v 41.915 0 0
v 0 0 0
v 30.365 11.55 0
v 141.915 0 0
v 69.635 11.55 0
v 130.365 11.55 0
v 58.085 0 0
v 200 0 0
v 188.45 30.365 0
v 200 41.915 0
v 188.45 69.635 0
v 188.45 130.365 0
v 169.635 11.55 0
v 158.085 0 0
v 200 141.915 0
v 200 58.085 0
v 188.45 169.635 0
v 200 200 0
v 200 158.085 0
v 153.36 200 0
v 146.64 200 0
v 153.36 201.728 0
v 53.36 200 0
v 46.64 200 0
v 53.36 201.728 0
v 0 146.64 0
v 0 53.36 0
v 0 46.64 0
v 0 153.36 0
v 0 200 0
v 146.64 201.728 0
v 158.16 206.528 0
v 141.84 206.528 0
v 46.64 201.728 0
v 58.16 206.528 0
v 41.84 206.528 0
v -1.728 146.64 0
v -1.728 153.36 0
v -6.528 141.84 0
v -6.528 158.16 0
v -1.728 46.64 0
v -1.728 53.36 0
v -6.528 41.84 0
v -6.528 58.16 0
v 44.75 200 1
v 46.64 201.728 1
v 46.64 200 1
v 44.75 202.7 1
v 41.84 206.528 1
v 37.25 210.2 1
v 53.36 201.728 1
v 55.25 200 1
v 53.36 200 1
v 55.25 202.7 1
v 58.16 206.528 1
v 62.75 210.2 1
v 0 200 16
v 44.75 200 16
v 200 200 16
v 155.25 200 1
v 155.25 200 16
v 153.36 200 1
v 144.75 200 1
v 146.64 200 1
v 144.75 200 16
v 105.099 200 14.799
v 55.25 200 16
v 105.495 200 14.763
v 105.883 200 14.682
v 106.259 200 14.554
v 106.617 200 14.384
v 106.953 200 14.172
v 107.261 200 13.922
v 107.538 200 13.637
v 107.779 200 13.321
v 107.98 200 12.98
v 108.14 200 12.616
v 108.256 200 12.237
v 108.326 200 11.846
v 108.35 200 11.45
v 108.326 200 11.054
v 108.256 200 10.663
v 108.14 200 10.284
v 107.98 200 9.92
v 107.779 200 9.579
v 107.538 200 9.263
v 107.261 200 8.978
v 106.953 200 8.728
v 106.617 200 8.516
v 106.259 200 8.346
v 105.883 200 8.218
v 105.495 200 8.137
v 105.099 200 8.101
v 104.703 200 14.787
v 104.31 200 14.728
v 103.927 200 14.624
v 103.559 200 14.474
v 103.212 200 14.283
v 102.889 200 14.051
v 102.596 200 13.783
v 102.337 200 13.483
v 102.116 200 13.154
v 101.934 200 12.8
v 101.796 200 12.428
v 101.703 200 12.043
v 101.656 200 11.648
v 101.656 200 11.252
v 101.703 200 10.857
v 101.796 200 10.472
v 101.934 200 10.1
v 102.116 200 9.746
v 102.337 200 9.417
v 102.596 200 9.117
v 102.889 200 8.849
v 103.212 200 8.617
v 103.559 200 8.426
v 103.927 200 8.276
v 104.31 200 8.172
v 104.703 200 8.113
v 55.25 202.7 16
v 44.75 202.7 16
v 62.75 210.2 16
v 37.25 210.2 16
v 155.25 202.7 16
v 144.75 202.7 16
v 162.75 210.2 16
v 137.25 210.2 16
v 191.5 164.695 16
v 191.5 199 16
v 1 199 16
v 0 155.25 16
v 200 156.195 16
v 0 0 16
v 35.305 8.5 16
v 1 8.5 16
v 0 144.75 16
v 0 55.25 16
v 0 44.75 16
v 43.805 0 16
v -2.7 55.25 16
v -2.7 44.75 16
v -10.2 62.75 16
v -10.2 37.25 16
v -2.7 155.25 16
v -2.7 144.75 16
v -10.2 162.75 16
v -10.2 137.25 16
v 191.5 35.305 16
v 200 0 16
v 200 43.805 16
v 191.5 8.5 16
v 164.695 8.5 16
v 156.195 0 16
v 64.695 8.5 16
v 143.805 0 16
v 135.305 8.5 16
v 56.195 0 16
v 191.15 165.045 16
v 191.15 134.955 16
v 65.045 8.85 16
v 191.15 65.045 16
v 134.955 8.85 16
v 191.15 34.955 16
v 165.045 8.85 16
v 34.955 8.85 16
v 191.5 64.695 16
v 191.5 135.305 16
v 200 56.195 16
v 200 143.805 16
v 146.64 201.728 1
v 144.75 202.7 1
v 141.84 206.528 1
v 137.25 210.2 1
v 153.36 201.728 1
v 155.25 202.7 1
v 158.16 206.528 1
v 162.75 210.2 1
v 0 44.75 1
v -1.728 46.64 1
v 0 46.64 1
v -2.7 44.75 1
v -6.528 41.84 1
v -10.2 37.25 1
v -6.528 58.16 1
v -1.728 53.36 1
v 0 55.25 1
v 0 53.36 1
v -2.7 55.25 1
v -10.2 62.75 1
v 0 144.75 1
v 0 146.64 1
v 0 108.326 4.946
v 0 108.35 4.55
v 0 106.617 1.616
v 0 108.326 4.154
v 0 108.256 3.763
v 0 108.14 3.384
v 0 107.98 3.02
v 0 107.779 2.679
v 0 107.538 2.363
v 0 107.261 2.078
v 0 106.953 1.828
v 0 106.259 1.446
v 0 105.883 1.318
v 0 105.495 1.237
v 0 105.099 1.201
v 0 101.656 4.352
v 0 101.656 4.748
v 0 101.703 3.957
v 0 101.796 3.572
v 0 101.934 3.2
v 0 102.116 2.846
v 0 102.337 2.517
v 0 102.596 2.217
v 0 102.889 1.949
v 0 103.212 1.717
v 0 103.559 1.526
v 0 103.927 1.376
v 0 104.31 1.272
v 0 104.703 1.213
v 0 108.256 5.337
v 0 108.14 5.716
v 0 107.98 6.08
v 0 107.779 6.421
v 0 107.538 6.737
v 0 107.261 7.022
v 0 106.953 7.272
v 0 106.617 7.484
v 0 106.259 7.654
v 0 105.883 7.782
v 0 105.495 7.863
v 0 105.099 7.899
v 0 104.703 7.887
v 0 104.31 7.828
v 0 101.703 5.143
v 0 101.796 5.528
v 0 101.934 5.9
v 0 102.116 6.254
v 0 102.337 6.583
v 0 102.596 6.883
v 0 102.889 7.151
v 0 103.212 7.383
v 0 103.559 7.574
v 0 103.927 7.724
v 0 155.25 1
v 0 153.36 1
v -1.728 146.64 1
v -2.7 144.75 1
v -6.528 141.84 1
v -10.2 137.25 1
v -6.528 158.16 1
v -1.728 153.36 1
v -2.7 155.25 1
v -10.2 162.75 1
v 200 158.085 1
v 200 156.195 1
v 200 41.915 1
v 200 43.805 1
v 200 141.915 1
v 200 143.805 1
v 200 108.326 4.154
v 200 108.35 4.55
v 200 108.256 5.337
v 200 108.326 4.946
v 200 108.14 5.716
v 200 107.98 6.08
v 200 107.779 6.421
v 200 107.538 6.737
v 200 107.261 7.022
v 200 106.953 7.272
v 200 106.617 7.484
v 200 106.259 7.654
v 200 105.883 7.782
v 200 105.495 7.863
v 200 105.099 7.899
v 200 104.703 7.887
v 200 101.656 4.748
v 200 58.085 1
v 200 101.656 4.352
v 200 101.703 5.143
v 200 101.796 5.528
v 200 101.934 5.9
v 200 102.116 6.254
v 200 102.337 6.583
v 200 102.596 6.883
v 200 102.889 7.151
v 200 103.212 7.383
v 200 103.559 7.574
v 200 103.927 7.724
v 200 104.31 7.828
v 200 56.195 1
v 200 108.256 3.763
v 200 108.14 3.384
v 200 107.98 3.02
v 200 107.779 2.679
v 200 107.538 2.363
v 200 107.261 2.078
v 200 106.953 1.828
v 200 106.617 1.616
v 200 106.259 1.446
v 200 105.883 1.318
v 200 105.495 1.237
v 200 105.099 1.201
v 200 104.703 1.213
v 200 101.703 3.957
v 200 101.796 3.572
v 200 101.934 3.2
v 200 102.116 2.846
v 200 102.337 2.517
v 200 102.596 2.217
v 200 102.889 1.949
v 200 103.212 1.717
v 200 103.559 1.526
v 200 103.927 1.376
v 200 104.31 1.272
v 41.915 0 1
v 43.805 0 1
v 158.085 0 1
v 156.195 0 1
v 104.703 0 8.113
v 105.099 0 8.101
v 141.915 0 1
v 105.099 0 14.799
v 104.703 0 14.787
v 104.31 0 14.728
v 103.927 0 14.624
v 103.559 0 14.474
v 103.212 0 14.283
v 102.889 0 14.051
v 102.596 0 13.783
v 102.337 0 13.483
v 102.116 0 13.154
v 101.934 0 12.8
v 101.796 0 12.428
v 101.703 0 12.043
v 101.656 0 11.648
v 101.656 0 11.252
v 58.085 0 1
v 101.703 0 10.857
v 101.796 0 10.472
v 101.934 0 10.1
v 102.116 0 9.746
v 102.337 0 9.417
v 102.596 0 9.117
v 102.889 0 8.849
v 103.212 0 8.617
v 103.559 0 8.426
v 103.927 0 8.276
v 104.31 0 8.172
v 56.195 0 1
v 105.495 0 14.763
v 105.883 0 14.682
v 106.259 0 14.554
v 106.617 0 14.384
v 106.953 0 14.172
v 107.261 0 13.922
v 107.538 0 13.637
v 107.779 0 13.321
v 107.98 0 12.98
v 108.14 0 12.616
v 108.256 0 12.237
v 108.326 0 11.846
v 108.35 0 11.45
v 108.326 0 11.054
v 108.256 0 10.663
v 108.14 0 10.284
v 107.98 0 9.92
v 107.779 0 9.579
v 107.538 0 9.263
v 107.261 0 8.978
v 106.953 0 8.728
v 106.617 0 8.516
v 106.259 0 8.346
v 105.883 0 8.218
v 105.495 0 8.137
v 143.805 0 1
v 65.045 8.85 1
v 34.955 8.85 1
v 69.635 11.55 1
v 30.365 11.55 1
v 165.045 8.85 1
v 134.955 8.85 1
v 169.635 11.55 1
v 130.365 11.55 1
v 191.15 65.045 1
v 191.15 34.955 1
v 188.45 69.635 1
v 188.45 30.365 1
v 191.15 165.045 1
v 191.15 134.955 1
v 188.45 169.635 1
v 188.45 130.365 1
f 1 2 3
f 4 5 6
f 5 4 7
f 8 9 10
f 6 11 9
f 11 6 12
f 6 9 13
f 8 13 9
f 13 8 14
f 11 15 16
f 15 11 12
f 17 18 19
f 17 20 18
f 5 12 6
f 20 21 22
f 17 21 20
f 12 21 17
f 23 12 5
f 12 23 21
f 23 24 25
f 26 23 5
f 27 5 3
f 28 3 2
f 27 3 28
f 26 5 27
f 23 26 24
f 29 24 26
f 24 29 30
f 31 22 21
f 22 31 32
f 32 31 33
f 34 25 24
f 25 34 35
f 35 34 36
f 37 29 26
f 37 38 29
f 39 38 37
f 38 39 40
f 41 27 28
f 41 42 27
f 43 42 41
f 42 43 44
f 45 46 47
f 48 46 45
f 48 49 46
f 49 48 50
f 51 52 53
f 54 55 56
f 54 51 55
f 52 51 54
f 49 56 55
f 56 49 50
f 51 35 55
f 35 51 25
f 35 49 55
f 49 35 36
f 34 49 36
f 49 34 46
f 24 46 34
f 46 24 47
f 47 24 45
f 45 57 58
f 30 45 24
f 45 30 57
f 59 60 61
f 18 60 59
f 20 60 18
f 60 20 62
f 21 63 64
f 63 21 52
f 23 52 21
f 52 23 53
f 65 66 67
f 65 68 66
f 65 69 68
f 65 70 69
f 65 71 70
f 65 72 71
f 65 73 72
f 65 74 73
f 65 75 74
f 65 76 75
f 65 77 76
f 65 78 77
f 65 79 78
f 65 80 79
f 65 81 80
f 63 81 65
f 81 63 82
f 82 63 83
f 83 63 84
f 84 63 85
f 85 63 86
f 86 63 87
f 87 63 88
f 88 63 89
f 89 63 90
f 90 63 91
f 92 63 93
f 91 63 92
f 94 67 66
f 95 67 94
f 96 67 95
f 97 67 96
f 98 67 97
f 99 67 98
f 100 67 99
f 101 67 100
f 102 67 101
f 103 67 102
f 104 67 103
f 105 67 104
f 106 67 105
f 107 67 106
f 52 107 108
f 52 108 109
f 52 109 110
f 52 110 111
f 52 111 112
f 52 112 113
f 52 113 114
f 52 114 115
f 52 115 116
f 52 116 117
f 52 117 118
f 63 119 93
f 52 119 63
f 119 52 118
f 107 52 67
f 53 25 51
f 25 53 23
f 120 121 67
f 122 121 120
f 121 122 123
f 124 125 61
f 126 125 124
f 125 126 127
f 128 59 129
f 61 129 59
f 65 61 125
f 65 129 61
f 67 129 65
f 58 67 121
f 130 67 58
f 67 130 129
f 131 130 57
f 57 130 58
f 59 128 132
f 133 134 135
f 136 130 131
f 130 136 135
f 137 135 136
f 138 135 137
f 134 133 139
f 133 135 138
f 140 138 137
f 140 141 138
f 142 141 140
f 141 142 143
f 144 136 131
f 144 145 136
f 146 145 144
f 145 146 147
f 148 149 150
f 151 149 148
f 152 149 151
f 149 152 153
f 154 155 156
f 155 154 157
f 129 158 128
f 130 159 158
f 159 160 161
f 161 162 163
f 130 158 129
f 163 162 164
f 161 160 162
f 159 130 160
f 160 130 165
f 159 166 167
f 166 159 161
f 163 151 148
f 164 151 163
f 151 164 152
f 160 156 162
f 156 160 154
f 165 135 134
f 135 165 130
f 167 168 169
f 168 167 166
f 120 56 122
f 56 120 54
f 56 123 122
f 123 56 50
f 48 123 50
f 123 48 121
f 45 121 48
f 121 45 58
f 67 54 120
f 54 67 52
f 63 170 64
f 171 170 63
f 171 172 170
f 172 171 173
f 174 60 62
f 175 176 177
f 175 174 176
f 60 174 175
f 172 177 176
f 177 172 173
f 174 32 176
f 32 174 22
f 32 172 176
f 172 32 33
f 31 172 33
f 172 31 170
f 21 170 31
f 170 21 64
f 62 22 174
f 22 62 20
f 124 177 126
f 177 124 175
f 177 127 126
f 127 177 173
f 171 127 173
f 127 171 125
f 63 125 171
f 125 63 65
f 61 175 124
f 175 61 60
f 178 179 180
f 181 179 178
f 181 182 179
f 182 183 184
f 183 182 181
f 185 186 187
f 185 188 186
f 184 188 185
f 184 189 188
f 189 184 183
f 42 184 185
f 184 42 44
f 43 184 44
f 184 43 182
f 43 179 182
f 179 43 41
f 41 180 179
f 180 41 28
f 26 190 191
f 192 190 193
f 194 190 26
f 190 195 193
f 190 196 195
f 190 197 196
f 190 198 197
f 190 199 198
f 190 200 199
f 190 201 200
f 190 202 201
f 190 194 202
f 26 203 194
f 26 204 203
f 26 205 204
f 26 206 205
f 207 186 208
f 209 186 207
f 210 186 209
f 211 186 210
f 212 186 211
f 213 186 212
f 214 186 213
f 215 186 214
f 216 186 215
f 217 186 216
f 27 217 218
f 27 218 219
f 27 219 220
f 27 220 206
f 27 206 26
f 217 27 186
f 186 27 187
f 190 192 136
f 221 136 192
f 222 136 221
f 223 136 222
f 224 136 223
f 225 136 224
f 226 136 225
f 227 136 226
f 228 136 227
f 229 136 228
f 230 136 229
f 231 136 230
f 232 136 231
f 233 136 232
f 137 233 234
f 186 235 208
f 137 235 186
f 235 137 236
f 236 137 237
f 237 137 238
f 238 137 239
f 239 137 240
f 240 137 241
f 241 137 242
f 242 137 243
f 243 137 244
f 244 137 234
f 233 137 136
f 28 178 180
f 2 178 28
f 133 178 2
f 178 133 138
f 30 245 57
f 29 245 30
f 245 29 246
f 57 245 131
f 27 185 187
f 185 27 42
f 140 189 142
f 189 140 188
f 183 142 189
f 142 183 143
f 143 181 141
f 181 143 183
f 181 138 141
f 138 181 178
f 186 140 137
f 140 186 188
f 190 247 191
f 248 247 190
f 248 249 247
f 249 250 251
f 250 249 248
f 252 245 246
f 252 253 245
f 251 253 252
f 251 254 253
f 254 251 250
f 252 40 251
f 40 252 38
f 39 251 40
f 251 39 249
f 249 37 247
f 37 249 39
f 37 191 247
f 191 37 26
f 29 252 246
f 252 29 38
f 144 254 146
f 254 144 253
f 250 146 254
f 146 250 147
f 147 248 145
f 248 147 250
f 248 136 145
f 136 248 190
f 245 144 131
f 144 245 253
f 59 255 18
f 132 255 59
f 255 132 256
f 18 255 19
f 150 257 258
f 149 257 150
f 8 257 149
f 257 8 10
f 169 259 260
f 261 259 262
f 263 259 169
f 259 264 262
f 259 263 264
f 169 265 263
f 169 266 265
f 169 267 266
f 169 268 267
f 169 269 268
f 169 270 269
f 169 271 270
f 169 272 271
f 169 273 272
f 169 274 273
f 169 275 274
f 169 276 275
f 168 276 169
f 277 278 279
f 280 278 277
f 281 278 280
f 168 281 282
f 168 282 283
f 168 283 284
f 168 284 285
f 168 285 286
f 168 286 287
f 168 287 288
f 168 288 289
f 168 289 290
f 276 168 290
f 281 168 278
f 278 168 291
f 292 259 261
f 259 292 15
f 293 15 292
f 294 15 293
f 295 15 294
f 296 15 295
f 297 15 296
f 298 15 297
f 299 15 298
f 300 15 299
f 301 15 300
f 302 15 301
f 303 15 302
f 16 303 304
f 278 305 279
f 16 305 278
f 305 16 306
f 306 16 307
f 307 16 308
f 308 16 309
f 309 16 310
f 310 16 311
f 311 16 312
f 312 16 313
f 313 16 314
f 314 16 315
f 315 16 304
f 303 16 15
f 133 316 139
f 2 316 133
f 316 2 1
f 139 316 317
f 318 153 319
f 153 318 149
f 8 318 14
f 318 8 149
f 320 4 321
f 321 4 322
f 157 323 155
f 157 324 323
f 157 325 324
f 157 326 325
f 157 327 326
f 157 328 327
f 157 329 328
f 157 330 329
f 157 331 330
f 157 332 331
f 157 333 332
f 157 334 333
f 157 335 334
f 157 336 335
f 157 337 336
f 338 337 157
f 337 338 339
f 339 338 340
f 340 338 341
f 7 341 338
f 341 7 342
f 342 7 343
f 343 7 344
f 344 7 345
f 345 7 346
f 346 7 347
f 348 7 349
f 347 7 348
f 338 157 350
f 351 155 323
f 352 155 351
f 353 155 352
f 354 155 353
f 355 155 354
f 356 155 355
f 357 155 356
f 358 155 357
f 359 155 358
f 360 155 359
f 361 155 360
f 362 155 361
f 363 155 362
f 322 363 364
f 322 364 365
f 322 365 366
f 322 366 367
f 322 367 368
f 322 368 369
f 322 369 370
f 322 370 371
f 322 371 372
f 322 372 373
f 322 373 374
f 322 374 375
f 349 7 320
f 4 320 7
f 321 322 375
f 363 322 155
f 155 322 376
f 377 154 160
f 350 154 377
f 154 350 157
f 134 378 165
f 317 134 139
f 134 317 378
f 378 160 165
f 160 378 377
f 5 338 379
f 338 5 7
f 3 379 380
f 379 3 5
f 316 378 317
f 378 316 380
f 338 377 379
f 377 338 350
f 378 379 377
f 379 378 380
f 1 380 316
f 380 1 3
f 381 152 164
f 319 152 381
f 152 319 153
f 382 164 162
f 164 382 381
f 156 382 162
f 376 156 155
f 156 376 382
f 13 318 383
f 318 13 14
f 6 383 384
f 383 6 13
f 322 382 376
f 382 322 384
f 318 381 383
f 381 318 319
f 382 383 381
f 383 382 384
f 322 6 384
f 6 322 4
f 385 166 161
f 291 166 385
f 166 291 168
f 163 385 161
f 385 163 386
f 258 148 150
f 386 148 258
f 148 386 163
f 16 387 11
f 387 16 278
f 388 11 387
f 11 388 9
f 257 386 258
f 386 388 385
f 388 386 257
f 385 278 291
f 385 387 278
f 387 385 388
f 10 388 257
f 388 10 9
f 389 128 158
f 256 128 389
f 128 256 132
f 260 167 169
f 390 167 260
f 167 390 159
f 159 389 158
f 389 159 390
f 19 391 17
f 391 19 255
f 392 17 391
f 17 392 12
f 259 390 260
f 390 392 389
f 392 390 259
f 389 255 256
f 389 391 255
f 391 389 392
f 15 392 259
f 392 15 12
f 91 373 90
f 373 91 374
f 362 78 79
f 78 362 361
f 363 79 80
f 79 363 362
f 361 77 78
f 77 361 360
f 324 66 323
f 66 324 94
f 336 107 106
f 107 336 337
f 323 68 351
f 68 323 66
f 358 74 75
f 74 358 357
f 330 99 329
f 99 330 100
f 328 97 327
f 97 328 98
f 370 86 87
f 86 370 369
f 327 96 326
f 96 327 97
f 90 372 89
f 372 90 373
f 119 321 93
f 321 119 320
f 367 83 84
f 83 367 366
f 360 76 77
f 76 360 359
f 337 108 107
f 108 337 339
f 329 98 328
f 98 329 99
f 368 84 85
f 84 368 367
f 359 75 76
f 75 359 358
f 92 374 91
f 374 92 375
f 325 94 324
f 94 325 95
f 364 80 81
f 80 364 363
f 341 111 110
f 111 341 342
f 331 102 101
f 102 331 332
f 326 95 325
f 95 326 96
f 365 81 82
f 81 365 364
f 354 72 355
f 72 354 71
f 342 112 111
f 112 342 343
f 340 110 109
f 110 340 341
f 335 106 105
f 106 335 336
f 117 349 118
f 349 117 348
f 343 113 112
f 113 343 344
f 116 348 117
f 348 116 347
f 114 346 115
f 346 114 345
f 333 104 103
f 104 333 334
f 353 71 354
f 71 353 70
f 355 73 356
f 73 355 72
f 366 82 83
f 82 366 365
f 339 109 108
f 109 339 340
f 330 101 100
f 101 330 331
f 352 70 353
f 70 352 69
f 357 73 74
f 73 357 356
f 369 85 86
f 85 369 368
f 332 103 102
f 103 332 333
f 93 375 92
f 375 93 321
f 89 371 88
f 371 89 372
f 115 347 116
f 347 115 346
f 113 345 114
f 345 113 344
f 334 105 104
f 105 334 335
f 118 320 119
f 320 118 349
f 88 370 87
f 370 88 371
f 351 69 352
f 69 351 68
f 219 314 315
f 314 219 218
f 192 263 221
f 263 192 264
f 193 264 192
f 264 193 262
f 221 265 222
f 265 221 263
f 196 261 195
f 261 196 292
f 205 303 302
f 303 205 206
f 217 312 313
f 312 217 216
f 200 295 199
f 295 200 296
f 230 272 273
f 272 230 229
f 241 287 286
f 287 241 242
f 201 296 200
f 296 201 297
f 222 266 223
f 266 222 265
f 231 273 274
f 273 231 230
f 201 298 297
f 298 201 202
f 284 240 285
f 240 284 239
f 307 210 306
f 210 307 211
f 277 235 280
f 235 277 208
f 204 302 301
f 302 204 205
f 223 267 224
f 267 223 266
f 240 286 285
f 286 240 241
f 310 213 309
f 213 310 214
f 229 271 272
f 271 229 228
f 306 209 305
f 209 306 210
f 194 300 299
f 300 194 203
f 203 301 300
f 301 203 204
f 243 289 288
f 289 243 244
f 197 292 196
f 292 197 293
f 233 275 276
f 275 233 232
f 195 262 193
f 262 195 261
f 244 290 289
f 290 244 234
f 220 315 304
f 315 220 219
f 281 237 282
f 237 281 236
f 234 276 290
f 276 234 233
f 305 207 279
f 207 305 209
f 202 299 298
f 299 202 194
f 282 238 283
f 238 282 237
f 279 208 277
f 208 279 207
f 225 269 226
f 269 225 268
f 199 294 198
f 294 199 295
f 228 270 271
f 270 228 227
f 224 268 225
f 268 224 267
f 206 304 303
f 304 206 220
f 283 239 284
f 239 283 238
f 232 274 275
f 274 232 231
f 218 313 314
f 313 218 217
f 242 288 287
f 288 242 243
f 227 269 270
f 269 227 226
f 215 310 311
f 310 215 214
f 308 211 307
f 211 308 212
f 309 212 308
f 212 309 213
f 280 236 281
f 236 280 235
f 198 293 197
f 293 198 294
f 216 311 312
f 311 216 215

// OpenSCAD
// Current data: 22h and 240g of PLA

$fa = 1;
$fs = 0.4;

module dovetile(
    //Box Width in units
    BoxWidthUnits = 2,
    //Box Length in units
    BoxLengthUnits = 2,
    //Box Height in mm
    BoxHeight = 16,
    //Box Floor Thickness in mm
    BoxFloor = 16,
    //North Wall open or closed
    NorthWallOpen = 0, // [0:Closed, 1:Open]
    //South Wall open or closed
    SouthWallOpen = 0 // [0:Closed, 1:Open]
)
{
echo(version=version(2.0));
//comments: Version 2 adds anti-"elephant foot" scaling at bottom of dovetail sections
/* [Size] */
//Box unit size in mm. This defines the size of 1 'unit' for your box.
BoxUnits = 100;
BoxWidth = BoxWidthUnits * BoxUnits;
BoxLength = BoxLengthUnits * BoxUnits;
//Box Wall Thickness in mm
BoxWall = 1;
//Fit Factor. Greater factor = looser fit
FitFactor = 0.18;  // [0:0.05:0.4]
//RoundedBottom = "EW"; // [EW:East-West, NS:North-South]
RoundedBottom = ""; // [EW:East-West, NS:North-South]

/* [Walls] */

/* [Dovetail] */
//Dovetail inside length in mm
DTInsideLength = 10.5;
//Dovetail angle in degrees
DTAngle = 45;
//Dovetail width in mm
DTWidth = 7.5;

/* [Hidden] */
//This helps calculate the length of the 'long' side of the dovetail
DTx=tan(DTAngle)*DTWidth;
//This polygon defines the dovetail shape
DTShape = [[0,0],[DTInsideLength/2,0],[DTInsideLength/2+DTx,DTWidth],[-DTInsideLength/2-DTx,DTWidth],[-DTInsideLength/2,0]];



union(){

    //Creates main box,without round bottom
    difference(){
        
    union(){
        //main box
    cube([BoxLength,BoxWidth,BoxHeight], center=false);

        //male dovetails
    for (i=[1:BoxLengthUnits])
    translate([(i-1)*BoxUnits+(BoxUnits/2),BoxWidth,0])
        //in 2 sections. first section is slightly scaled down to counter "elephant foot"
        union(){
            linear_extrude(height=1, center=false)
                scale([1-(2*FitFactor),1-(2*FitFactor),1])
                union(){        
                    //this adds a slight offset to the male dovetail for a looser fit
                    translate([-DTInsideLength/2,0,0])
                    square([DTInsideLength,DTWidth]);
                    //main dovetail shape
                    translate([0,DTWidth*FitFactor*2,0])
                    polygon(DTShape);
                };
            translate([0,0,1])
            linear_extrude(height=BoxHeight-1, center=false)
                    union(){
                    //this adds a slight offset to the male dovetail for a looser fit
                    translate([-DTInsideLength/2,0,0])
                    square([DTInsideLength,DTWidth]);
                    //main dovetail shape
                    translate([0,DTWidth*FitFactor*2,0])
                    polygon(DTShape);
                    };
        }        

    for (i=[1:BoxWidthUnits])
    translate([0,(i-1)*BoxUnits+(BoxUnits/2),0])
        //in 2 sections. first section is slightly scaled down to counter "elephant foot"
        rotate([0,0,90])
        union(){
            linear_extrude(height=1, center=false)				//1mm high anti-elephant foot section
                scale([1-(2*FitFactor),1-(2*FitFactor),1])
                union(){        
                    //this adds a slight offset to the male dovetail for a looser fit
                    translate([-DTInsideLength/2,0,0])
                    square([DTInsideLength,DTWidth]);
                    //main dovetail shape
                    translate([0,DTWidth*FitFactor*2,0])
                    polygon(DTShape);
                };
            translate([0,0,1])
            linear_extrude(height=BoxHeight-1, center=false)
                union(){
                    //male dovetail offset
                    translate([-DTInsideLength/2,0,0])
                    square([DTInsideLength,DTWidth]);
                    //main dovetail shape
                    translate([0,DTWidth*FitFactor*2,0])
                    polygon(DTShape);
                };
        }
    }
    //female dovetails
    for (i=[1:BoxLengthUnits])
        union(){
            translate([(i-1)*BoxUnits+(BoxUnits/2),0,0])
                scale([1+FitFactor,1+FitFactor,1])
                linear_extrude(height=BoxHeight, center=false)
                polygon(DTShape);
        
            //added a second dovetail cutout at the bottom, scaled up to counter "elephant foot" when printed
            translate([(i-1)*BoxUnits+(BoxUnits/2),0,0])
                scale([1+(3*FitFactor),1+(3*FitFactor),1])
                linear_extrude(height=1, center=false)
                polygon(DTShape);					
        }

    for (i=[1:BoxWidthUnits])
        union(){
            translate([BoxLength,(i-1)*BoxUnits+(BoxUnits/2),0])
                rotate([0,0,90])
                    scale([1+FitFactor,1+FitFactor,1])
                        linear_extrude(height=BoxHeight, center=false)
                            polygon(DTShape);
            //added a second dovetail cutout at the bottom, scaled up to counter "elephant foot" when printed
            translate([BoxLength,(i-1)*BoxUnits+(BoxUnits/2),0])
                rotate([0,0,90])
                    scale([1+(3*FitFactor),1+(3*FitFactor),1])
                        linear_extrude(height=1, center=false)
                            polygon(DTShape);	
        }
    //carves out main box
    translate([BoxWall,DTWidth+BoxWall,BoxFloor])
        cube([BoxLength-(2*BoxWall)-DTWidth, (BoxWidth-(2*BoxWall)-DTWidth), BoxHeight]);

    if (NorthWallOpen)
        translate([-DTWidth*(1+FitFactor+FitFactor),BoxWall+DTWidth,BoxFloor])
            cube([BoxWall+(DTWidth*(1+FitFactor+FitFactor)), (BoxWidth-(2*BoxWall)-DTWidth), BoxHeight]);    

    if (SouthWallOpen)
        translate([BoxLength-(BoxWall)-DTWidth,BoxWall+DTWidth,BoxFloor])
            cube([BoxWall+DTWidth, (BoxWidth-(2*BoxWall)-DTWidth), BoxHeight]);

    }
  }
}

module basetile() {
  
  //This needs to be broken out as variables
  tilecountx=2;
  tilecounty=2;
  tilez=16;
  
  tilex = tilecountx * 105;
  tiley = tilecounty * 105;
  
  //Fit the rod
  holediameter=6.7;
  
  //For enough strength, and also matching Cura wall
  //Start with cura wall size
  curawalltopbottom=0.8;
  curainternalwall=0.4;
  wallmin=curawalltopbottom+curainternalwall;
  
  tileheight=tilez;
  
  //Offset holes to match wallmin from top/bottom wall
  holeoffset=tileheight/2-holediameter/2-wallmin;

  
  difference () {
    dovetile(tilecountx,tilecounty,tilez);
    translate([tilex/2,tiley/2,tilez/2+holeoffset]) rotate([90,0,0]) cylinder(d=holediameter,h=tilex,center=true);
    translate([tilex/2,tiley/2,tilez/2-holeoffset]) rotate([90,0,90]) cylinder(d=holediameter,h=tiley,center=true);
  }
}

basetile();
